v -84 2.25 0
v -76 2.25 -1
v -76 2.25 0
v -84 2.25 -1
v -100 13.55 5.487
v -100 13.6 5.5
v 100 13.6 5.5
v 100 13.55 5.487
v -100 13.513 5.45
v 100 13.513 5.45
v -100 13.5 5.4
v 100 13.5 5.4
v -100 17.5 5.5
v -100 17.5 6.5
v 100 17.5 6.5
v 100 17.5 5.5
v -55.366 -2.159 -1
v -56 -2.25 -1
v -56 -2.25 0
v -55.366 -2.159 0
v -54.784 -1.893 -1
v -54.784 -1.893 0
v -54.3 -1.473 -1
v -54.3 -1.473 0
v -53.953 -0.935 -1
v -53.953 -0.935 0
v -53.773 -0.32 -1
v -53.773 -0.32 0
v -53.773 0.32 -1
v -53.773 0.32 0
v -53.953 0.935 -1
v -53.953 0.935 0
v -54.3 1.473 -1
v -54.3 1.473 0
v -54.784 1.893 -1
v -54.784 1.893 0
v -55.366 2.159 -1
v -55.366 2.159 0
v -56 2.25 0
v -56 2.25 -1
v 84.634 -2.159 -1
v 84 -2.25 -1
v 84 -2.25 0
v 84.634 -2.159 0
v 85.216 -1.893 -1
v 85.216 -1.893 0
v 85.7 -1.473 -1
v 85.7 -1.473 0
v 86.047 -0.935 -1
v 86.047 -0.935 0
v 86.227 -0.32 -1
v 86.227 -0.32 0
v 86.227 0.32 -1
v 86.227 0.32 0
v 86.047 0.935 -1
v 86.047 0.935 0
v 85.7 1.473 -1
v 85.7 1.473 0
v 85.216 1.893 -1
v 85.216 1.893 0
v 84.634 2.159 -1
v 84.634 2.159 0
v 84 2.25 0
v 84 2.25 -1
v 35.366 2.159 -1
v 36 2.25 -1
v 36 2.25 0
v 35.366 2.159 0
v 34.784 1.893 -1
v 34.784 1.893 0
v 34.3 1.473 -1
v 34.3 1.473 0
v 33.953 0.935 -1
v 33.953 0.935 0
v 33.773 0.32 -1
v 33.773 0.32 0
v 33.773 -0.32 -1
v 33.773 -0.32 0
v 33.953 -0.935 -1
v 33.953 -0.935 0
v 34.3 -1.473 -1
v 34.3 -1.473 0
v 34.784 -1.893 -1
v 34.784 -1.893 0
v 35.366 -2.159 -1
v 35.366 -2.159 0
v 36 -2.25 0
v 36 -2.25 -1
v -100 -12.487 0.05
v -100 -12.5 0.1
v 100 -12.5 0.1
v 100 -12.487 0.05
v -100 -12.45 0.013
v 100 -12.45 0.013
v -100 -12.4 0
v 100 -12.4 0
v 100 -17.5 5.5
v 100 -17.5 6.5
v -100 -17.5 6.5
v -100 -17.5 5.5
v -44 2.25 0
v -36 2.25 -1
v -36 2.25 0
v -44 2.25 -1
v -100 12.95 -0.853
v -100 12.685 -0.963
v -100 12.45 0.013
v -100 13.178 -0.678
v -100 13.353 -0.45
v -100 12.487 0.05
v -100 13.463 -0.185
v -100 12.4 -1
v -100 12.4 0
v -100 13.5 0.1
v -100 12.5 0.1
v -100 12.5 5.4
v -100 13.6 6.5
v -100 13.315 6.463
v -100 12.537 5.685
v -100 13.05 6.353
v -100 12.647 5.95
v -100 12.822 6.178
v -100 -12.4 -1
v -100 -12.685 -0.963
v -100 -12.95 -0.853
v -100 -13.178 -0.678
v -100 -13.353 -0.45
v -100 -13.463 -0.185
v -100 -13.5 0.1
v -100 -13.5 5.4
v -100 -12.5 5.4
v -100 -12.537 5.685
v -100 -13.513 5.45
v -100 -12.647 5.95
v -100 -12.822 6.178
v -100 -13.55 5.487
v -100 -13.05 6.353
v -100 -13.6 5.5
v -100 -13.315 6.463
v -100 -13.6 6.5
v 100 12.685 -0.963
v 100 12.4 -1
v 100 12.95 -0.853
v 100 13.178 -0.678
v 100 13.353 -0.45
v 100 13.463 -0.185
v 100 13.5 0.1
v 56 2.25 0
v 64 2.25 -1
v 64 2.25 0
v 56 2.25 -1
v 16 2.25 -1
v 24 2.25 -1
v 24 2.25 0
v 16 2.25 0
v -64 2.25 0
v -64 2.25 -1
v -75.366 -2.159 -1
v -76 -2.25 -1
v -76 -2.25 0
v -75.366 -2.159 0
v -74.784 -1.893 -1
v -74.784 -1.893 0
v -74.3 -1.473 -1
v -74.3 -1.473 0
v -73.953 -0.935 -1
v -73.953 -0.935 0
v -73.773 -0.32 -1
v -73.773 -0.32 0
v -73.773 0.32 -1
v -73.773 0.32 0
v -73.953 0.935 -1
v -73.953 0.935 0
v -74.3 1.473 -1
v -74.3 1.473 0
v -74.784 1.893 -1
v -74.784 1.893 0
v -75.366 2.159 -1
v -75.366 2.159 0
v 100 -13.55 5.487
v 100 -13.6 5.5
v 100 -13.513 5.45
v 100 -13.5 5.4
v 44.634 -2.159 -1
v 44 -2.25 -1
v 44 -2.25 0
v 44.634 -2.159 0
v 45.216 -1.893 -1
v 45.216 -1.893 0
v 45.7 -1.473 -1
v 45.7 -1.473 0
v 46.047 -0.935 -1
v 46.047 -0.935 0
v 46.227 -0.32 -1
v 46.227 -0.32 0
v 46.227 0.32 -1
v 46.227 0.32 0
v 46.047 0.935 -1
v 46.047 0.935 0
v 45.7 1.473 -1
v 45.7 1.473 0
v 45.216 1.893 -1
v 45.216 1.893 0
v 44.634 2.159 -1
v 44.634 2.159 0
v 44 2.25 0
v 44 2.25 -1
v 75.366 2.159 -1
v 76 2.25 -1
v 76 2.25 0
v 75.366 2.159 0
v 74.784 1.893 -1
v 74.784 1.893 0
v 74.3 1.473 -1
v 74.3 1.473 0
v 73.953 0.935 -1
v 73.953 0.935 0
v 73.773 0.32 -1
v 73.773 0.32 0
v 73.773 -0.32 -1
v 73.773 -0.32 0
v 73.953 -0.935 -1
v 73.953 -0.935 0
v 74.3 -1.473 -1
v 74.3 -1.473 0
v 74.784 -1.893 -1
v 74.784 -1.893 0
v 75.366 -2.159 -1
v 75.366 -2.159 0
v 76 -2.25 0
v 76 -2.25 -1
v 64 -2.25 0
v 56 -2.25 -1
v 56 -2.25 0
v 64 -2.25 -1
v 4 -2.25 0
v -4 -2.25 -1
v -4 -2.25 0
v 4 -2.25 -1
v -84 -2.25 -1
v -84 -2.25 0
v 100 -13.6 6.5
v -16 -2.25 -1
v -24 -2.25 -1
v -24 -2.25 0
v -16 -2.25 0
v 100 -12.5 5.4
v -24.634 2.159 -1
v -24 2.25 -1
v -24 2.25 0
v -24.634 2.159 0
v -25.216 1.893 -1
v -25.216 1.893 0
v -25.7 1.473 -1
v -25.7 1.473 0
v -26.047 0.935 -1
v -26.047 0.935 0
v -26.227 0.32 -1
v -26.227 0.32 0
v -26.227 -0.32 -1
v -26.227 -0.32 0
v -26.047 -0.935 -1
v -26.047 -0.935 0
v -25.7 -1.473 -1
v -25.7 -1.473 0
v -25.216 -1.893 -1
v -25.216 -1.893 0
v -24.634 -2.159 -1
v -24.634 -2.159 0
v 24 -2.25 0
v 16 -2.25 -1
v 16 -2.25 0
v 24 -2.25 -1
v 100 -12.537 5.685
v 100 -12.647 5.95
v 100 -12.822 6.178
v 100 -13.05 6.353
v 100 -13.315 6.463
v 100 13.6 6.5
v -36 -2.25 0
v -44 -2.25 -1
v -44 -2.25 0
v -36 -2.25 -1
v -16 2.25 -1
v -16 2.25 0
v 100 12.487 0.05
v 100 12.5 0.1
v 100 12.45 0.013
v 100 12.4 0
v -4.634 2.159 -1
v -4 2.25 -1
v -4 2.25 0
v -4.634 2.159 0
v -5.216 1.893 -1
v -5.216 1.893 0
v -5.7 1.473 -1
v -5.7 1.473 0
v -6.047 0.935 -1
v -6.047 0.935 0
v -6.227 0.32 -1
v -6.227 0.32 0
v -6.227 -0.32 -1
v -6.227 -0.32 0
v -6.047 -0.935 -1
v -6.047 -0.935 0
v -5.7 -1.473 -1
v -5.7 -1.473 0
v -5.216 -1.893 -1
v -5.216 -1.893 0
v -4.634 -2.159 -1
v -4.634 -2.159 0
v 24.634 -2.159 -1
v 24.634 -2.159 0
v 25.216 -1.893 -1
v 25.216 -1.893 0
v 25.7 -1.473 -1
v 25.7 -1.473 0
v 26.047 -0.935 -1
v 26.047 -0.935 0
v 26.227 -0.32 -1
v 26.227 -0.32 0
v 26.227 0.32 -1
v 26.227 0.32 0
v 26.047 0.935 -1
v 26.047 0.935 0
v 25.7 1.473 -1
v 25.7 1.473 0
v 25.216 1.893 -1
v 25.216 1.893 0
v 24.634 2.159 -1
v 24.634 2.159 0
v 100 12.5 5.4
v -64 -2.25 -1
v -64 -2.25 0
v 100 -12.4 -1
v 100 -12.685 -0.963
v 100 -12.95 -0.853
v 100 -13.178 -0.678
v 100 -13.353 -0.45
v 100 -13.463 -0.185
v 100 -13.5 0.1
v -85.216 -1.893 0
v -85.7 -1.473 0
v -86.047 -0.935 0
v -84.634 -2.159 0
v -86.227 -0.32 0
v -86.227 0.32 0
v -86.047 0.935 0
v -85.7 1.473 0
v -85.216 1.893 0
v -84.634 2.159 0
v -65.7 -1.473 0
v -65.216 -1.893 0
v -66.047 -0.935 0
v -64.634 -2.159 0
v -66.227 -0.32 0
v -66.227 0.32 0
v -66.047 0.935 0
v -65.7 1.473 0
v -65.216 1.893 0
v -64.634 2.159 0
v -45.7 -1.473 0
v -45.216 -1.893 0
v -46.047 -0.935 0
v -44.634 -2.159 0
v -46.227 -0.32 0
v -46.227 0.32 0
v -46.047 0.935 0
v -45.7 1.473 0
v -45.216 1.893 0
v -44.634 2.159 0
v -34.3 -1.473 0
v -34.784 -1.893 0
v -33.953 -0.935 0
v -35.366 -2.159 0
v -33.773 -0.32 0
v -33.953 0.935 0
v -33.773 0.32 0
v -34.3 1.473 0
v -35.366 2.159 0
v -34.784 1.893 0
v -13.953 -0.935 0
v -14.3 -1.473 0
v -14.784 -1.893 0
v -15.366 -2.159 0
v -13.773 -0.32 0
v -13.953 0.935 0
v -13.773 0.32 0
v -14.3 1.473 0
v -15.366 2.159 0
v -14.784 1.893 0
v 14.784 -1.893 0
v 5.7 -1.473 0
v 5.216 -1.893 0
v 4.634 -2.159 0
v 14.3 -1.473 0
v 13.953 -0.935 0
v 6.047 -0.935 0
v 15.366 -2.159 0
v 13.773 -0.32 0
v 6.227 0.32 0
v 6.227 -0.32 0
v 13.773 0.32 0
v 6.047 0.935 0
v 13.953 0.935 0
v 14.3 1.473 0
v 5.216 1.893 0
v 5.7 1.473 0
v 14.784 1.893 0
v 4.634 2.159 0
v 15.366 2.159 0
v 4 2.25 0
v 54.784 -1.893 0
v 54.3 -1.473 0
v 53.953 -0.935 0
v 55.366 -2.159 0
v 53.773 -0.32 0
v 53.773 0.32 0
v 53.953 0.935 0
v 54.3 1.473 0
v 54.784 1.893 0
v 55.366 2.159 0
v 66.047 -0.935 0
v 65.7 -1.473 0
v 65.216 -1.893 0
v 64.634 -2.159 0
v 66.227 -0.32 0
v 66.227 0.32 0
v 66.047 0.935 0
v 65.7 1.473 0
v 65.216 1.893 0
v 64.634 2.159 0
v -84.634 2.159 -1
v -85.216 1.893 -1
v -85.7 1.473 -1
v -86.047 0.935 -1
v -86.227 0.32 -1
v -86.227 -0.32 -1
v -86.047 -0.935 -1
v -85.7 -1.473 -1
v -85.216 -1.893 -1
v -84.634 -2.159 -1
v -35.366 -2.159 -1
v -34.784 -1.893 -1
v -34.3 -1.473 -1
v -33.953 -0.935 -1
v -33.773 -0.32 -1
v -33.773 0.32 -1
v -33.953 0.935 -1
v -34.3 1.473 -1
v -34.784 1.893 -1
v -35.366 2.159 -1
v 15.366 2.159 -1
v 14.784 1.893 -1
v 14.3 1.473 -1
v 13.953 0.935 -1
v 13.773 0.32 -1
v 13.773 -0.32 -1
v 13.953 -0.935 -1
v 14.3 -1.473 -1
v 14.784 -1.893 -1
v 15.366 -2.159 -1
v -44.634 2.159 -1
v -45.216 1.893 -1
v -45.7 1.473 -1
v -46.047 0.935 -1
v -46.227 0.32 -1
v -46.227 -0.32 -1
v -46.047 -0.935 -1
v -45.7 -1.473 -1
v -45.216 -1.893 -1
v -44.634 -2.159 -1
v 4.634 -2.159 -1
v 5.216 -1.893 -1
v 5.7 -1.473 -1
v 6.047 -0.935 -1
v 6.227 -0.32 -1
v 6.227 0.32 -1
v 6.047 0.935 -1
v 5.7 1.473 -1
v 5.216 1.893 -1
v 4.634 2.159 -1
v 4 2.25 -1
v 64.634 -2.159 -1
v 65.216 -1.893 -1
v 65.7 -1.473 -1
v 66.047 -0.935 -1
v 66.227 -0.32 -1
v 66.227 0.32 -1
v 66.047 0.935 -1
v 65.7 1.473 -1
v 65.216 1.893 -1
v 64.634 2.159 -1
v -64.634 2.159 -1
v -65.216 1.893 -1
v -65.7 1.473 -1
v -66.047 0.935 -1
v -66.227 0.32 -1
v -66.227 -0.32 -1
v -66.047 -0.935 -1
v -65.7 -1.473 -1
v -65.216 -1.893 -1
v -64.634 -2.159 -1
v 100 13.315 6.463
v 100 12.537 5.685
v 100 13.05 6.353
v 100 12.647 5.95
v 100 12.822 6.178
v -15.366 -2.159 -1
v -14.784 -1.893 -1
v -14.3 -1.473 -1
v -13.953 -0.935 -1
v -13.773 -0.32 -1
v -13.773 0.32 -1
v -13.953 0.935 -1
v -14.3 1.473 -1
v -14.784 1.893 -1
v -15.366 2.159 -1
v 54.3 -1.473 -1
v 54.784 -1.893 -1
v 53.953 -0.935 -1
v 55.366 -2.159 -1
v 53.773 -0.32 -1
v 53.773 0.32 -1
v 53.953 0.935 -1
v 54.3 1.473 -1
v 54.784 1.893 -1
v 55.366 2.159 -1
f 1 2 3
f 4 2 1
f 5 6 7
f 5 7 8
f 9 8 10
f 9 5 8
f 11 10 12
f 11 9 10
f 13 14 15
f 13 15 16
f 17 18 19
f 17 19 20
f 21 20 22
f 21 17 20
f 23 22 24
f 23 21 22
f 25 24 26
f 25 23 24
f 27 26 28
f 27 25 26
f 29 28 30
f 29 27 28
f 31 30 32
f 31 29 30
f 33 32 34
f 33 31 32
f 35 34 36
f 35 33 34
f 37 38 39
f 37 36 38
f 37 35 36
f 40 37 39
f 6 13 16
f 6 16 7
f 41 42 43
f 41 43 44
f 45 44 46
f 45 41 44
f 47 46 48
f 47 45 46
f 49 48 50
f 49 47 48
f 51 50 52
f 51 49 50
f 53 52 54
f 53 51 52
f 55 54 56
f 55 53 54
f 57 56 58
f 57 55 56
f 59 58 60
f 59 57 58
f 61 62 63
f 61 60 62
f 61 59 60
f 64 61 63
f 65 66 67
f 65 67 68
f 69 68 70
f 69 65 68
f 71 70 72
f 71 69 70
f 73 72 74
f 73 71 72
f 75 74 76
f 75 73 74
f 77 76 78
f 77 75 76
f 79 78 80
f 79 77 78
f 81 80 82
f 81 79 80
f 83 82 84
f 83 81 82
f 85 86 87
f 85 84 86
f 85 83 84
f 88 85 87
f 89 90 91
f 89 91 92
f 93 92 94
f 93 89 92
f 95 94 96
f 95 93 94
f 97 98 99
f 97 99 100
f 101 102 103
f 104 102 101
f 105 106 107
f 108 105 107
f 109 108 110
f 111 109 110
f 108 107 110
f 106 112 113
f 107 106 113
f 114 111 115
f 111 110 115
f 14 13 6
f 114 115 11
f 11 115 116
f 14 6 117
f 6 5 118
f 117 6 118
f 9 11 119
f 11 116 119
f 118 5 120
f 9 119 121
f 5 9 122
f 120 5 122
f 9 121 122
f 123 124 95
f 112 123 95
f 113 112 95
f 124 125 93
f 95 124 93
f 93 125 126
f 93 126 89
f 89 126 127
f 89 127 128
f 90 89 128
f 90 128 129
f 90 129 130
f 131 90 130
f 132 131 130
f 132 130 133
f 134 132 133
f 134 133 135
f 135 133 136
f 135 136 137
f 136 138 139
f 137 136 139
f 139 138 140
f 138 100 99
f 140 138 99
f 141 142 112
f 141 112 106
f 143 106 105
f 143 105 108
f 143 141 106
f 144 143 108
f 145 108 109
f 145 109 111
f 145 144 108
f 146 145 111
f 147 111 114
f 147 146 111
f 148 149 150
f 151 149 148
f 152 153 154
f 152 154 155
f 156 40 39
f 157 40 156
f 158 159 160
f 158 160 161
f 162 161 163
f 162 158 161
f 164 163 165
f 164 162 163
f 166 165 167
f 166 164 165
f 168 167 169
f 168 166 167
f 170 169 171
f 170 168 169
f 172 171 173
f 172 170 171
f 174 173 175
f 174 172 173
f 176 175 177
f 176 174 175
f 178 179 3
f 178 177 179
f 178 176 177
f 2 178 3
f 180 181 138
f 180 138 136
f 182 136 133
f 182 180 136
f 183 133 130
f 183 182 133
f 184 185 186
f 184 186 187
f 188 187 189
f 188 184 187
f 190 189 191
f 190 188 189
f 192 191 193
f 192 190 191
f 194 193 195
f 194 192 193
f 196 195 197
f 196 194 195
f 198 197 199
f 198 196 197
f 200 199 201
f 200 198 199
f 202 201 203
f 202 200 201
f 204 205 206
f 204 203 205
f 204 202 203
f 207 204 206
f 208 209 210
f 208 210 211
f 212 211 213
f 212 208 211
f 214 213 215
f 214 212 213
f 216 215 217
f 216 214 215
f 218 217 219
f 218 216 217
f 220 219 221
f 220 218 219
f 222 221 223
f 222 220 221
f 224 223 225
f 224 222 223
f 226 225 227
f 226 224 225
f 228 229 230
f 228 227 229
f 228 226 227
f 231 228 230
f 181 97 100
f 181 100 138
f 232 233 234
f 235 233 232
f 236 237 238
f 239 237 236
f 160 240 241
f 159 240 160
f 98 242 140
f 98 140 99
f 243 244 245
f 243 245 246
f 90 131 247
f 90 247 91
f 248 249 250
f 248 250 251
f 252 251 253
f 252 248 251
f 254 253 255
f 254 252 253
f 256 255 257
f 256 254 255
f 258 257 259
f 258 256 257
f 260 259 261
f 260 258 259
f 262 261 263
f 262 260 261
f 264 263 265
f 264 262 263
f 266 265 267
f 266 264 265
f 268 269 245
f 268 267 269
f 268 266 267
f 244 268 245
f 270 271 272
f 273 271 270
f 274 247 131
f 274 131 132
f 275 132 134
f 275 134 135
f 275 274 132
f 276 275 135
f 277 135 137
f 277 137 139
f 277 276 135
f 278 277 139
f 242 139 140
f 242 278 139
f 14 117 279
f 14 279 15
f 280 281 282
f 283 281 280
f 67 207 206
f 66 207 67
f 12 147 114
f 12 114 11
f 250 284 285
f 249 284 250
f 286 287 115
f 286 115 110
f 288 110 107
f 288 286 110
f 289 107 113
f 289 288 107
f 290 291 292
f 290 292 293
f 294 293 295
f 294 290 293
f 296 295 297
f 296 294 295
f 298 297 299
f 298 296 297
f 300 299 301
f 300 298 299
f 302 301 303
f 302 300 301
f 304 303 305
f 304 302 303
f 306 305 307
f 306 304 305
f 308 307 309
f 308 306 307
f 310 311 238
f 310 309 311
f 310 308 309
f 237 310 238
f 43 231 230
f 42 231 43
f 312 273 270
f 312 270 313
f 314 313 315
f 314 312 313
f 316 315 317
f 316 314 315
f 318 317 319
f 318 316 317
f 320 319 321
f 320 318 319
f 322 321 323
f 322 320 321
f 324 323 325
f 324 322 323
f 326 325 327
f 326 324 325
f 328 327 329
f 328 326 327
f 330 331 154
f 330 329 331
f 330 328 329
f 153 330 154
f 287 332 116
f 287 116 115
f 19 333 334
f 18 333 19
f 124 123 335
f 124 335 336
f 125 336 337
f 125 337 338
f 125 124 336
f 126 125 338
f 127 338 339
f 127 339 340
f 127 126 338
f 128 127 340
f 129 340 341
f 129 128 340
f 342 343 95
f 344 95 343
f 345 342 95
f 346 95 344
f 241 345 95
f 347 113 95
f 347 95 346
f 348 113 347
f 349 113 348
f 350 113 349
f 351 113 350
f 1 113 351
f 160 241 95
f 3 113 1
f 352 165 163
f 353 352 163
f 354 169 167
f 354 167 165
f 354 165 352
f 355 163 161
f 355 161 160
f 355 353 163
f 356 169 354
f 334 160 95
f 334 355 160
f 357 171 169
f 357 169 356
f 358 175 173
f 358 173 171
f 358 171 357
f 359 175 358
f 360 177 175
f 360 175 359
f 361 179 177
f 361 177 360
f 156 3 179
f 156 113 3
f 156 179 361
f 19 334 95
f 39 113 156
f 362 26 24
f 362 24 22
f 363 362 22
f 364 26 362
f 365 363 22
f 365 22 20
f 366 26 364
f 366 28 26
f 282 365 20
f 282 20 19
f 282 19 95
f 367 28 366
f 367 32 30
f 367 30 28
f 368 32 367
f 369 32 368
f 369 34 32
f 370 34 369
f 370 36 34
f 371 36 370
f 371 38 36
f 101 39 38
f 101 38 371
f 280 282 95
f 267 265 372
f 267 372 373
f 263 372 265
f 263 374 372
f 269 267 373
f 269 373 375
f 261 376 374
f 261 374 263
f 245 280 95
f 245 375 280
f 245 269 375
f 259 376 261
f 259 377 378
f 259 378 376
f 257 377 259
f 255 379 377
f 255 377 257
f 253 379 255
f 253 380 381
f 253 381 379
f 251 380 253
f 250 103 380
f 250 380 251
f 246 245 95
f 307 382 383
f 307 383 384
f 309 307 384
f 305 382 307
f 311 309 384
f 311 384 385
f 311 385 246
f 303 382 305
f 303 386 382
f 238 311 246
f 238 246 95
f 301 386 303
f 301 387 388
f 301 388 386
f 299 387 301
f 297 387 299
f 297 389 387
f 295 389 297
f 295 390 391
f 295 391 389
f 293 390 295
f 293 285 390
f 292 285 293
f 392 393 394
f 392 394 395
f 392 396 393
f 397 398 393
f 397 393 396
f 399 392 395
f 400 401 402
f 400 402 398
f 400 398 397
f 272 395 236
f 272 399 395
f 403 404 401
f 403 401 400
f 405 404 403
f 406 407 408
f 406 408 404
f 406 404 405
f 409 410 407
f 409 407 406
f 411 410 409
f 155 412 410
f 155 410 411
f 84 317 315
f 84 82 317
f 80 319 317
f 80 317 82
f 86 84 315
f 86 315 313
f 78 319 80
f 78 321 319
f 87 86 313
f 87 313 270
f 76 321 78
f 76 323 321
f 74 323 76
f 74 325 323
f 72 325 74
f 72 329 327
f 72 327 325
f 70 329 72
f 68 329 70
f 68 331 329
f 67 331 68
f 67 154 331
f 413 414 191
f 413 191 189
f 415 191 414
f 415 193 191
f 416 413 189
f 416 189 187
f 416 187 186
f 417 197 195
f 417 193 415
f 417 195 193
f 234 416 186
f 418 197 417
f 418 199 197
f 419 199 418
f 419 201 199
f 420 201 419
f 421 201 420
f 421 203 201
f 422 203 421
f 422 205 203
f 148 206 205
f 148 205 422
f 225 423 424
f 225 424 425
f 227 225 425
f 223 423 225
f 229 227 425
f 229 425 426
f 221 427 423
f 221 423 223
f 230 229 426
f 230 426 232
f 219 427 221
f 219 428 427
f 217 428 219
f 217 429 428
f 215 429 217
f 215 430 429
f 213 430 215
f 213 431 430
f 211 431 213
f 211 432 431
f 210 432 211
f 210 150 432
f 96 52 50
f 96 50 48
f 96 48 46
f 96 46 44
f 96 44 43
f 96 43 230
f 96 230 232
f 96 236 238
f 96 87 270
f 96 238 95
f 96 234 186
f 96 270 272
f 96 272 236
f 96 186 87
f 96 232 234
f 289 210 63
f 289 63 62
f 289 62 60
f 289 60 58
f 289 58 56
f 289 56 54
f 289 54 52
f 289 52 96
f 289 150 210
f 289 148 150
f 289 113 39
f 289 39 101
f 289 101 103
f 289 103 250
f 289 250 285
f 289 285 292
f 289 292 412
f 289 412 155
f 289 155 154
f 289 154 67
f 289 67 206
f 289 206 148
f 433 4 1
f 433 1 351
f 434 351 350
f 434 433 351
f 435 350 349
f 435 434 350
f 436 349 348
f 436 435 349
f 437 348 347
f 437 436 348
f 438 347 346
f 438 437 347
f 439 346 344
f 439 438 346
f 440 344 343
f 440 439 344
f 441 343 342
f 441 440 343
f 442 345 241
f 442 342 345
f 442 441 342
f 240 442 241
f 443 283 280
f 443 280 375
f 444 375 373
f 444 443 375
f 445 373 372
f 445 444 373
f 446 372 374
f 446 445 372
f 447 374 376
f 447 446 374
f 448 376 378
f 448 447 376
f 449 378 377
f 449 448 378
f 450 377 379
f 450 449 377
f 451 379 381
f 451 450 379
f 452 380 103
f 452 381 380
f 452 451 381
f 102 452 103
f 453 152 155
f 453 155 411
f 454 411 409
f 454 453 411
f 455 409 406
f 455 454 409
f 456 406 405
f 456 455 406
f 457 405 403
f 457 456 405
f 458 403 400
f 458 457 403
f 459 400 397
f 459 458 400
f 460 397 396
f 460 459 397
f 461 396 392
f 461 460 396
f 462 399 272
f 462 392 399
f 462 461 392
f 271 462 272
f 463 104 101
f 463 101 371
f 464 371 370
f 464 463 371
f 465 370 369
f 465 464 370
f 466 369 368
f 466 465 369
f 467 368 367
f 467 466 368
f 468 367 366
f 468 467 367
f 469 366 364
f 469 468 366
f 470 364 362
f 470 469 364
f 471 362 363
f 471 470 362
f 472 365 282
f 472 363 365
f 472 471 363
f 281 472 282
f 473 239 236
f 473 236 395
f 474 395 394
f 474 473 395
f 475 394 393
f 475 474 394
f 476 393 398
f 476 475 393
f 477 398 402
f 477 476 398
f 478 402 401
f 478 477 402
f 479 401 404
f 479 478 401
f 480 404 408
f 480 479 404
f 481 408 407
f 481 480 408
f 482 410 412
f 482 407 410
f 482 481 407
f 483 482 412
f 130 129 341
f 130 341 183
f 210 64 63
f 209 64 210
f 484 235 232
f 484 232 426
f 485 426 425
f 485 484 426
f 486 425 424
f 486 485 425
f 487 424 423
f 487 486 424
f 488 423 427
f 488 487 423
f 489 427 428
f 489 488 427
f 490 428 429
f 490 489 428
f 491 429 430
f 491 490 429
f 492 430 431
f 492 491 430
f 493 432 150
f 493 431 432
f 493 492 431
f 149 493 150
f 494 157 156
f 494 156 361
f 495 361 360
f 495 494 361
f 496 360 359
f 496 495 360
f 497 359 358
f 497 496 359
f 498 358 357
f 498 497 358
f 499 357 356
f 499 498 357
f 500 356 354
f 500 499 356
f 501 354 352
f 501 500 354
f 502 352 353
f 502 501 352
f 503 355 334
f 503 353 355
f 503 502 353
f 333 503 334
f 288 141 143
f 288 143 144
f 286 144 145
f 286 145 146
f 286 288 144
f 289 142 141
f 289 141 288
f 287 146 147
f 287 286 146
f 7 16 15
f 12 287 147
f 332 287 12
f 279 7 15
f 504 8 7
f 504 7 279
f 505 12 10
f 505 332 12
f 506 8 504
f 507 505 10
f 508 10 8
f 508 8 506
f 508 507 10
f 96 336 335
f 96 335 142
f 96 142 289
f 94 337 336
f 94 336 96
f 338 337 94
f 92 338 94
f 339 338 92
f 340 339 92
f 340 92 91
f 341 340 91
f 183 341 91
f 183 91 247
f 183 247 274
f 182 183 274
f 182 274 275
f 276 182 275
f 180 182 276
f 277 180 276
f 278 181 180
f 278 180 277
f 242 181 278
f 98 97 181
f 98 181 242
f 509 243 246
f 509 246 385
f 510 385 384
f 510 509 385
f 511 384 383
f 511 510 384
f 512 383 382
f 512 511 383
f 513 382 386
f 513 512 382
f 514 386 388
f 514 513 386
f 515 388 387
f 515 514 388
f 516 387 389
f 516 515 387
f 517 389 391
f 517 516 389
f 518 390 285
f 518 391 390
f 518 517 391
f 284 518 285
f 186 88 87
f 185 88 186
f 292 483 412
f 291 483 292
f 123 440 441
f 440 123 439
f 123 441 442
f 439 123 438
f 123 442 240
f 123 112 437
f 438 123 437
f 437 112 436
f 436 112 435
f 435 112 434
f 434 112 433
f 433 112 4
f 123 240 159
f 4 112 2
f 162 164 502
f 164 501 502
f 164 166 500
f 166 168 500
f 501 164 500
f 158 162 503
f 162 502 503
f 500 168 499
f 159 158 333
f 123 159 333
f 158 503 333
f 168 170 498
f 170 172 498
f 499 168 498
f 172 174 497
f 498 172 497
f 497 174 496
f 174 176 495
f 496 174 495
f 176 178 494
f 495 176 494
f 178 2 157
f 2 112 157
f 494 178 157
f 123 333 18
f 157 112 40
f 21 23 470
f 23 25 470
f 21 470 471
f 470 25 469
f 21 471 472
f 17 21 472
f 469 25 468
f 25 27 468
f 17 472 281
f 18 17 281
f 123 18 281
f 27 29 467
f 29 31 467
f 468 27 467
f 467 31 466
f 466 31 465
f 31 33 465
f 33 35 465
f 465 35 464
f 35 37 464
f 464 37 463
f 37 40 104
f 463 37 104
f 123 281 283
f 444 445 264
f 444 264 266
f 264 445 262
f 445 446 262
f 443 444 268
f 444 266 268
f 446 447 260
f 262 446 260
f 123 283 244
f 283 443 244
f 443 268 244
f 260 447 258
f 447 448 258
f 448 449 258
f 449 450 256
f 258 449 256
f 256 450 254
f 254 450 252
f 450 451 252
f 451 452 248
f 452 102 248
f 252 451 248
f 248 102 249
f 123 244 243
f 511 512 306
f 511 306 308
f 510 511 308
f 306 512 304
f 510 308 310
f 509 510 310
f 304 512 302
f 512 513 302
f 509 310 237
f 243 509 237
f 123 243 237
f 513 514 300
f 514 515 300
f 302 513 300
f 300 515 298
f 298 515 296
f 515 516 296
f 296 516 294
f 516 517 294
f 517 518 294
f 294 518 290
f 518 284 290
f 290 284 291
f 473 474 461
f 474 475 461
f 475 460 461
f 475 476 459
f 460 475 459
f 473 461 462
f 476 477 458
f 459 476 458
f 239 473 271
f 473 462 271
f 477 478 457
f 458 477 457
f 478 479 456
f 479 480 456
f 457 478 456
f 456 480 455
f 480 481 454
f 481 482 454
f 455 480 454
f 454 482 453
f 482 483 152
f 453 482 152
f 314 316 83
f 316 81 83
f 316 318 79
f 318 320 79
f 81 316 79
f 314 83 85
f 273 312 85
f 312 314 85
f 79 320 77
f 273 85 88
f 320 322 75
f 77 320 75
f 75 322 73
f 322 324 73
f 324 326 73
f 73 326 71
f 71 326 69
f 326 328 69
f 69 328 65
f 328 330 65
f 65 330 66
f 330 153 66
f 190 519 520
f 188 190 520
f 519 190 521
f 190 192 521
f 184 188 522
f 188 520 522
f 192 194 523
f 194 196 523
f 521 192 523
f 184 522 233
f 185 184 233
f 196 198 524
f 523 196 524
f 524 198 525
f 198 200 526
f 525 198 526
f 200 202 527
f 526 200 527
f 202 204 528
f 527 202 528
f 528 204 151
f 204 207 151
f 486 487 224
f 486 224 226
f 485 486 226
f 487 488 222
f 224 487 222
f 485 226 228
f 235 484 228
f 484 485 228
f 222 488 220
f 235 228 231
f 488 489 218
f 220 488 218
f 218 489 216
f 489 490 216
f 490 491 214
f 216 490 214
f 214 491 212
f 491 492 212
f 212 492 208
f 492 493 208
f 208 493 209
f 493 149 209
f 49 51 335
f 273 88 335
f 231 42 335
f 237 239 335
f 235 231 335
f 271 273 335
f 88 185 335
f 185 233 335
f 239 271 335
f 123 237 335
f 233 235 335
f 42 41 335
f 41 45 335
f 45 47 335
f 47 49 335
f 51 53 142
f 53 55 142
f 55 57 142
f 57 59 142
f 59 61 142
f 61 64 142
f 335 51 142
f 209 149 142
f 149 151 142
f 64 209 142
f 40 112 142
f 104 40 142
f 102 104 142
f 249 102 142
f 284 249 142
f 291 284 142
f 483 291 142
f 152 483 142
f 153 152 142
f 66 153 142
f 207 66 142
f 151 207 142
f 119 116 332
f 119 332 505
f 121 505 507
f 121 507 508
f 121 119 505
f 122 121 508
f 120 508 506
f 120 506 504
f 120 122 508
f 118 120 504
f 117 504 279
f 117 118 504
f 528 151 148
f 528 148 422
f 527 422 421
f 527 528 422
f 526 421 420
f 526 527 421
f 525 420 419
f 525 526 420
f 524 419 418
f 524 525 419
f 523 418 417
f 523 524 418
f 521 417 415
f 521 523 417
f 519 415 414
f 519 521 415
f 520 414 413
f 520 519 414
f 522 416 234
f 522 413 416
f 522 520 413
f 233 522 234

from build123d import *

# Parameters (mm, degrees)
SKETCH_1_W                         = 200
SKETCH_1_H                         = 27
SM_BASE_FLANGE_1_DEPTH             = 1
SM_EDGE_FLANGE_1_STRIP_W           = 4.2
SM_EDGE_FLANGE_1_STRIP_H           = 1
SM_EDGE_FLANGE_1_STRIP_CUT_DEPTH   = 200
SM_EDGE_FLANGE_1_STRIP_2_W         = 4.2
SM_EDGE_FLANGE_1_STRIP_2_H         = 1
SM_EDGE_FLANGE_1_STRIP_CUT_2_DEPTH = 200
SM_EDGE_FLANGE_1_DEPTH             = 200
SM_EDGE_FLANGE_1_BEND_DEPTH        = 200
SM_EDGE_FLANGE_2_STRIP_W           = 4.2
SM_EDGE_FLANGE_2_STRIP_H           = 1
SM_EDGE_FLANGE_2_STRIP_CUT_DEPTH   = 200
SM_EDGE_FLANGE_2_STRIP_2_W         = 4.2
SM_EDGE_FLANGE_2_STRIP_2_H         = 1
SM_EDGE_FLANGE_2_STRIP_CUT_2_DEPTH = 200
SM_EDGE_FLANGE_2_DEPTH             = 200
SM_EDGE_FLANGE_2_BEND_DEPTH        = 200
CUT_EXTRUDE_1_DEPTH                = 10
PATTERN_LINEAR_1_COUNT             = 5
PATTERN_LINEAR_1_PITCH             = 20
PATTERN_LINEAR_1_COL_COUNT         = 5
PATTERN_LINEAR_1_COL_PITCH         = 20


# Sheet-metal steps are written as plain solids
with BuildPart() as part:
    # Sketch 1 → 基体-法兰1 (new body)
    with BuildSketch(Plane.XY):
        Rectangle(SKETCH_1_W, SKETCH_1_H)
    extrude(amount=-SM_BASE_FLANGE_1_DEPTH)

    # 边线-法兰1 strip (across the edge) → 边线-法兰1 strip cut (cut)
    with BuildSketch(Plane(origin=(100, 13.5, 0), x_dir=(0, -1, 0), z_dir=(-1, 0, 0))):
        with Locations((-1, -0.5)):
            Rectangle(SM_EDGE_FLANGE_1_STRIP_W, SM_EDGE_FLANGE_1_STRIP_H)
    extrude(amount=SM_EDGE_FLANGE_1_STRIP_CUT_DEPTH, mode=Mode.SUBTRACT)

    # 边线-法兰1 strip 2 (across the edge) → 边线-法兰1 strip cut 2 (cut)
    with BuildSketch(Plane(origin=(-100, -13.5, 0), x_dir=(0, 1, 0), z_dir=(1, 0, 0))):
        with Locations((-1, -0.5)):
            Rectangle(SM_EDGE_FLANGE_1_STRIP_2_W, SM_EDGE_FLANGE_1_STRIP_2_H)
    extrude(amount=SM_EDGE_FLANGE_1_STRIP_CUT_2_DEPTH, mode=Mode.SUBTRACT)

    # 边线-法兰1 section (across the edge) → 边线-法兰1 (add)
    with BuildSketch(Plane(origin=(100, 13.5, 0), x_dir=(0, -1, 0), z_dir=(-1, 0, 0))):
        with BuildLine():
            Line((0, 0.1), (0, 6.5))
            Line((0, 6.5), (1, 6.5))
            Line((1, 6.5), (1, 0.1))
            ThreePointArc((1, 0.1), (1.029289322, 0.029289322), (1.1, 0))
            Line((1.1, 0), (1.1, -1))
            ThreePointArc((1.1, -1), (0.322182541, -0.677817459), (0, 0.1))
        make_face()
    extrude(amount=SM_EDGE_FLANGE_1_DEPTH)

    # 边线-法兰1 section 2 (across the edge) → 边线-法兰1 bend (add)
    with BuildSketch(Plane(origin=(-100, -13.5, 0), x_dir=(0, 1, 0), z_dir=(1, 0, 0))):
        with BuildLine():
            Line((0, 0.1), (0, 6.5))
            Line((0, 6.5), (1, 6.5))
            Line((1, 6.5), (1, 0.1))
            ThreePointArc((1, 0.1), (1.029289322, 0.029289322), (1.1, 0))
            Line((1.1, 0), (1.1, -1))
            ThreePointArc((1.1, -1), (0.322182541, -0.677817459), (0, 0.1))
        make_face()
    extrude(amount=SM_EDGE_FLANGE_1_BEND_DEPTH)

    # 边线-法兰2 strip (across the edge) → 边线-法兰2 strip cut (cut)
    with BuildSketch(Plane(origin=(-100, 13.5, 6.5), x_dir=(0, 0, -1), z_dir=(1, 0, 0))):
        with Locations((-1, -0.5)):
            Rectangle(SM_EDGE_FLANGE_2_STRIP_W, SM_EDGE_FLANGE_2_STRIP_H)
    extrude(amount=SM_EDGE_FLANGE_2_STRIP_CUT_DEPTH, mode=Mode.SUBTRACT)

    # 边线-法兰2 strip 2 (across the edge) → 边线-法兰2 strip cut 2 (cut)
    with BuildSketch(Plane(origin=(100, -13.5, 6.5), x_dir=(0, 0, -1), z_dir=(-1, 0, 0))):
        with Locations((-1, -0.5)):
            Rectangle(SM_EDGE_FLANGE_2_STRIP_2_W, SM_EDGE_FLANGE_2_STRIP_2_H)
    extrude(amount=SM_EDGE_FLANGE_2_STRIP_CUT_2_DEPTH, mode=Mode.SUBTRACT)

    # 边线-法兰2 section (across the edge) → 边线-法兰2 (add)
    with BuildSketch(Plane(origin=(-100, 13.5, 6.5), x_dir=(0, 0, -1), z_dir=(1, 0, 0))):
        with BuildLine():
            Line((0, 0.1), (0, 4))
            Line((0, 4), (1, 4))
            Line((1, 4), (1, 0.1))
            ThreePointArc((1, 0.1), (1.029289322, 0.029289322), (1.1, 0))
            Line((1.1, 0), (1.1, -1))
            ThreePointArc((1.1, -1), (0.322182541, -0.677817459), (0, 0.1))
        make_face()
    extrude(amount=SM_EDGE_FLANGE_2_DEPTH)

    # 边线-法兰2 section 2 (across the edge) → 边线-法兰2 bend (add)
    with BuildSketch(Plane(origin=(100, -13.5, 6.5), x_dir=(0, 0, -1), z_dir=(-1, 0, 0))):
        with BuildLine():
            Line((0, 0.1), (0, 4))
            Line((0, 4), (1, 4))
            Line((1, 4), (1, 0.1))
            ThreePointArc((1, 0.1), (1.029289322, 0.029289322), (1.1, 0))
            Line((1.1, 0), (1.1, -1))
            ThreePointArc((1.1, -1), (0.322182541, -0.677817459), (0, 0.1))
        make_face()
    extrude(amount=SM_EDGE_FLANGE_2_BEND_DEPTH)

    # 草图18 → 切除-拉伸1 (cut)
    with BuildSketch(Plane(origin=(0, 0, -1), x_dir=(-1, 0, 0), z_dir=(0, 0, -1))):
        with BuildLine():
            Line((-4, 2.25), (4, 2.25))
            ThreePointArc((4, 2.25), (6.25, 0), (4, -2.25))
            Line((4, -2.25), (-4, -2.25))
            ThreePointArc((-4, -2.25), (-6.25, 0), (-4, 2.25))
        make_face()
    cut_extrude_1 = extrude(amount=-CUT_EXTRUDE_1_DEPTH, mode=Mode.SUBTRACT)

    # 阵列(线性)1: 切除-拉伸1 ×5
    with Locations(*[(i * PATTERN_LINEAR_1_PITCH, 0, 0) for i in range(1, PATTERN_LINEAR_1_COUNT)]):
        add(cut_extrude_1, mode=Mode.SUBTRACT)

    # 阵列(线性)1 col: 切除-拉伸1 ×5
    with Locations(*[(-i * PATTERN_LINEAR_1_COL_PITCH, 0, 0) for i in range(1, PATTERN_LINEAR_1_COL_COUNT)]):
        add(cut_extrude_1, mode=Mode.SUBTRACT)


solid = part.part
